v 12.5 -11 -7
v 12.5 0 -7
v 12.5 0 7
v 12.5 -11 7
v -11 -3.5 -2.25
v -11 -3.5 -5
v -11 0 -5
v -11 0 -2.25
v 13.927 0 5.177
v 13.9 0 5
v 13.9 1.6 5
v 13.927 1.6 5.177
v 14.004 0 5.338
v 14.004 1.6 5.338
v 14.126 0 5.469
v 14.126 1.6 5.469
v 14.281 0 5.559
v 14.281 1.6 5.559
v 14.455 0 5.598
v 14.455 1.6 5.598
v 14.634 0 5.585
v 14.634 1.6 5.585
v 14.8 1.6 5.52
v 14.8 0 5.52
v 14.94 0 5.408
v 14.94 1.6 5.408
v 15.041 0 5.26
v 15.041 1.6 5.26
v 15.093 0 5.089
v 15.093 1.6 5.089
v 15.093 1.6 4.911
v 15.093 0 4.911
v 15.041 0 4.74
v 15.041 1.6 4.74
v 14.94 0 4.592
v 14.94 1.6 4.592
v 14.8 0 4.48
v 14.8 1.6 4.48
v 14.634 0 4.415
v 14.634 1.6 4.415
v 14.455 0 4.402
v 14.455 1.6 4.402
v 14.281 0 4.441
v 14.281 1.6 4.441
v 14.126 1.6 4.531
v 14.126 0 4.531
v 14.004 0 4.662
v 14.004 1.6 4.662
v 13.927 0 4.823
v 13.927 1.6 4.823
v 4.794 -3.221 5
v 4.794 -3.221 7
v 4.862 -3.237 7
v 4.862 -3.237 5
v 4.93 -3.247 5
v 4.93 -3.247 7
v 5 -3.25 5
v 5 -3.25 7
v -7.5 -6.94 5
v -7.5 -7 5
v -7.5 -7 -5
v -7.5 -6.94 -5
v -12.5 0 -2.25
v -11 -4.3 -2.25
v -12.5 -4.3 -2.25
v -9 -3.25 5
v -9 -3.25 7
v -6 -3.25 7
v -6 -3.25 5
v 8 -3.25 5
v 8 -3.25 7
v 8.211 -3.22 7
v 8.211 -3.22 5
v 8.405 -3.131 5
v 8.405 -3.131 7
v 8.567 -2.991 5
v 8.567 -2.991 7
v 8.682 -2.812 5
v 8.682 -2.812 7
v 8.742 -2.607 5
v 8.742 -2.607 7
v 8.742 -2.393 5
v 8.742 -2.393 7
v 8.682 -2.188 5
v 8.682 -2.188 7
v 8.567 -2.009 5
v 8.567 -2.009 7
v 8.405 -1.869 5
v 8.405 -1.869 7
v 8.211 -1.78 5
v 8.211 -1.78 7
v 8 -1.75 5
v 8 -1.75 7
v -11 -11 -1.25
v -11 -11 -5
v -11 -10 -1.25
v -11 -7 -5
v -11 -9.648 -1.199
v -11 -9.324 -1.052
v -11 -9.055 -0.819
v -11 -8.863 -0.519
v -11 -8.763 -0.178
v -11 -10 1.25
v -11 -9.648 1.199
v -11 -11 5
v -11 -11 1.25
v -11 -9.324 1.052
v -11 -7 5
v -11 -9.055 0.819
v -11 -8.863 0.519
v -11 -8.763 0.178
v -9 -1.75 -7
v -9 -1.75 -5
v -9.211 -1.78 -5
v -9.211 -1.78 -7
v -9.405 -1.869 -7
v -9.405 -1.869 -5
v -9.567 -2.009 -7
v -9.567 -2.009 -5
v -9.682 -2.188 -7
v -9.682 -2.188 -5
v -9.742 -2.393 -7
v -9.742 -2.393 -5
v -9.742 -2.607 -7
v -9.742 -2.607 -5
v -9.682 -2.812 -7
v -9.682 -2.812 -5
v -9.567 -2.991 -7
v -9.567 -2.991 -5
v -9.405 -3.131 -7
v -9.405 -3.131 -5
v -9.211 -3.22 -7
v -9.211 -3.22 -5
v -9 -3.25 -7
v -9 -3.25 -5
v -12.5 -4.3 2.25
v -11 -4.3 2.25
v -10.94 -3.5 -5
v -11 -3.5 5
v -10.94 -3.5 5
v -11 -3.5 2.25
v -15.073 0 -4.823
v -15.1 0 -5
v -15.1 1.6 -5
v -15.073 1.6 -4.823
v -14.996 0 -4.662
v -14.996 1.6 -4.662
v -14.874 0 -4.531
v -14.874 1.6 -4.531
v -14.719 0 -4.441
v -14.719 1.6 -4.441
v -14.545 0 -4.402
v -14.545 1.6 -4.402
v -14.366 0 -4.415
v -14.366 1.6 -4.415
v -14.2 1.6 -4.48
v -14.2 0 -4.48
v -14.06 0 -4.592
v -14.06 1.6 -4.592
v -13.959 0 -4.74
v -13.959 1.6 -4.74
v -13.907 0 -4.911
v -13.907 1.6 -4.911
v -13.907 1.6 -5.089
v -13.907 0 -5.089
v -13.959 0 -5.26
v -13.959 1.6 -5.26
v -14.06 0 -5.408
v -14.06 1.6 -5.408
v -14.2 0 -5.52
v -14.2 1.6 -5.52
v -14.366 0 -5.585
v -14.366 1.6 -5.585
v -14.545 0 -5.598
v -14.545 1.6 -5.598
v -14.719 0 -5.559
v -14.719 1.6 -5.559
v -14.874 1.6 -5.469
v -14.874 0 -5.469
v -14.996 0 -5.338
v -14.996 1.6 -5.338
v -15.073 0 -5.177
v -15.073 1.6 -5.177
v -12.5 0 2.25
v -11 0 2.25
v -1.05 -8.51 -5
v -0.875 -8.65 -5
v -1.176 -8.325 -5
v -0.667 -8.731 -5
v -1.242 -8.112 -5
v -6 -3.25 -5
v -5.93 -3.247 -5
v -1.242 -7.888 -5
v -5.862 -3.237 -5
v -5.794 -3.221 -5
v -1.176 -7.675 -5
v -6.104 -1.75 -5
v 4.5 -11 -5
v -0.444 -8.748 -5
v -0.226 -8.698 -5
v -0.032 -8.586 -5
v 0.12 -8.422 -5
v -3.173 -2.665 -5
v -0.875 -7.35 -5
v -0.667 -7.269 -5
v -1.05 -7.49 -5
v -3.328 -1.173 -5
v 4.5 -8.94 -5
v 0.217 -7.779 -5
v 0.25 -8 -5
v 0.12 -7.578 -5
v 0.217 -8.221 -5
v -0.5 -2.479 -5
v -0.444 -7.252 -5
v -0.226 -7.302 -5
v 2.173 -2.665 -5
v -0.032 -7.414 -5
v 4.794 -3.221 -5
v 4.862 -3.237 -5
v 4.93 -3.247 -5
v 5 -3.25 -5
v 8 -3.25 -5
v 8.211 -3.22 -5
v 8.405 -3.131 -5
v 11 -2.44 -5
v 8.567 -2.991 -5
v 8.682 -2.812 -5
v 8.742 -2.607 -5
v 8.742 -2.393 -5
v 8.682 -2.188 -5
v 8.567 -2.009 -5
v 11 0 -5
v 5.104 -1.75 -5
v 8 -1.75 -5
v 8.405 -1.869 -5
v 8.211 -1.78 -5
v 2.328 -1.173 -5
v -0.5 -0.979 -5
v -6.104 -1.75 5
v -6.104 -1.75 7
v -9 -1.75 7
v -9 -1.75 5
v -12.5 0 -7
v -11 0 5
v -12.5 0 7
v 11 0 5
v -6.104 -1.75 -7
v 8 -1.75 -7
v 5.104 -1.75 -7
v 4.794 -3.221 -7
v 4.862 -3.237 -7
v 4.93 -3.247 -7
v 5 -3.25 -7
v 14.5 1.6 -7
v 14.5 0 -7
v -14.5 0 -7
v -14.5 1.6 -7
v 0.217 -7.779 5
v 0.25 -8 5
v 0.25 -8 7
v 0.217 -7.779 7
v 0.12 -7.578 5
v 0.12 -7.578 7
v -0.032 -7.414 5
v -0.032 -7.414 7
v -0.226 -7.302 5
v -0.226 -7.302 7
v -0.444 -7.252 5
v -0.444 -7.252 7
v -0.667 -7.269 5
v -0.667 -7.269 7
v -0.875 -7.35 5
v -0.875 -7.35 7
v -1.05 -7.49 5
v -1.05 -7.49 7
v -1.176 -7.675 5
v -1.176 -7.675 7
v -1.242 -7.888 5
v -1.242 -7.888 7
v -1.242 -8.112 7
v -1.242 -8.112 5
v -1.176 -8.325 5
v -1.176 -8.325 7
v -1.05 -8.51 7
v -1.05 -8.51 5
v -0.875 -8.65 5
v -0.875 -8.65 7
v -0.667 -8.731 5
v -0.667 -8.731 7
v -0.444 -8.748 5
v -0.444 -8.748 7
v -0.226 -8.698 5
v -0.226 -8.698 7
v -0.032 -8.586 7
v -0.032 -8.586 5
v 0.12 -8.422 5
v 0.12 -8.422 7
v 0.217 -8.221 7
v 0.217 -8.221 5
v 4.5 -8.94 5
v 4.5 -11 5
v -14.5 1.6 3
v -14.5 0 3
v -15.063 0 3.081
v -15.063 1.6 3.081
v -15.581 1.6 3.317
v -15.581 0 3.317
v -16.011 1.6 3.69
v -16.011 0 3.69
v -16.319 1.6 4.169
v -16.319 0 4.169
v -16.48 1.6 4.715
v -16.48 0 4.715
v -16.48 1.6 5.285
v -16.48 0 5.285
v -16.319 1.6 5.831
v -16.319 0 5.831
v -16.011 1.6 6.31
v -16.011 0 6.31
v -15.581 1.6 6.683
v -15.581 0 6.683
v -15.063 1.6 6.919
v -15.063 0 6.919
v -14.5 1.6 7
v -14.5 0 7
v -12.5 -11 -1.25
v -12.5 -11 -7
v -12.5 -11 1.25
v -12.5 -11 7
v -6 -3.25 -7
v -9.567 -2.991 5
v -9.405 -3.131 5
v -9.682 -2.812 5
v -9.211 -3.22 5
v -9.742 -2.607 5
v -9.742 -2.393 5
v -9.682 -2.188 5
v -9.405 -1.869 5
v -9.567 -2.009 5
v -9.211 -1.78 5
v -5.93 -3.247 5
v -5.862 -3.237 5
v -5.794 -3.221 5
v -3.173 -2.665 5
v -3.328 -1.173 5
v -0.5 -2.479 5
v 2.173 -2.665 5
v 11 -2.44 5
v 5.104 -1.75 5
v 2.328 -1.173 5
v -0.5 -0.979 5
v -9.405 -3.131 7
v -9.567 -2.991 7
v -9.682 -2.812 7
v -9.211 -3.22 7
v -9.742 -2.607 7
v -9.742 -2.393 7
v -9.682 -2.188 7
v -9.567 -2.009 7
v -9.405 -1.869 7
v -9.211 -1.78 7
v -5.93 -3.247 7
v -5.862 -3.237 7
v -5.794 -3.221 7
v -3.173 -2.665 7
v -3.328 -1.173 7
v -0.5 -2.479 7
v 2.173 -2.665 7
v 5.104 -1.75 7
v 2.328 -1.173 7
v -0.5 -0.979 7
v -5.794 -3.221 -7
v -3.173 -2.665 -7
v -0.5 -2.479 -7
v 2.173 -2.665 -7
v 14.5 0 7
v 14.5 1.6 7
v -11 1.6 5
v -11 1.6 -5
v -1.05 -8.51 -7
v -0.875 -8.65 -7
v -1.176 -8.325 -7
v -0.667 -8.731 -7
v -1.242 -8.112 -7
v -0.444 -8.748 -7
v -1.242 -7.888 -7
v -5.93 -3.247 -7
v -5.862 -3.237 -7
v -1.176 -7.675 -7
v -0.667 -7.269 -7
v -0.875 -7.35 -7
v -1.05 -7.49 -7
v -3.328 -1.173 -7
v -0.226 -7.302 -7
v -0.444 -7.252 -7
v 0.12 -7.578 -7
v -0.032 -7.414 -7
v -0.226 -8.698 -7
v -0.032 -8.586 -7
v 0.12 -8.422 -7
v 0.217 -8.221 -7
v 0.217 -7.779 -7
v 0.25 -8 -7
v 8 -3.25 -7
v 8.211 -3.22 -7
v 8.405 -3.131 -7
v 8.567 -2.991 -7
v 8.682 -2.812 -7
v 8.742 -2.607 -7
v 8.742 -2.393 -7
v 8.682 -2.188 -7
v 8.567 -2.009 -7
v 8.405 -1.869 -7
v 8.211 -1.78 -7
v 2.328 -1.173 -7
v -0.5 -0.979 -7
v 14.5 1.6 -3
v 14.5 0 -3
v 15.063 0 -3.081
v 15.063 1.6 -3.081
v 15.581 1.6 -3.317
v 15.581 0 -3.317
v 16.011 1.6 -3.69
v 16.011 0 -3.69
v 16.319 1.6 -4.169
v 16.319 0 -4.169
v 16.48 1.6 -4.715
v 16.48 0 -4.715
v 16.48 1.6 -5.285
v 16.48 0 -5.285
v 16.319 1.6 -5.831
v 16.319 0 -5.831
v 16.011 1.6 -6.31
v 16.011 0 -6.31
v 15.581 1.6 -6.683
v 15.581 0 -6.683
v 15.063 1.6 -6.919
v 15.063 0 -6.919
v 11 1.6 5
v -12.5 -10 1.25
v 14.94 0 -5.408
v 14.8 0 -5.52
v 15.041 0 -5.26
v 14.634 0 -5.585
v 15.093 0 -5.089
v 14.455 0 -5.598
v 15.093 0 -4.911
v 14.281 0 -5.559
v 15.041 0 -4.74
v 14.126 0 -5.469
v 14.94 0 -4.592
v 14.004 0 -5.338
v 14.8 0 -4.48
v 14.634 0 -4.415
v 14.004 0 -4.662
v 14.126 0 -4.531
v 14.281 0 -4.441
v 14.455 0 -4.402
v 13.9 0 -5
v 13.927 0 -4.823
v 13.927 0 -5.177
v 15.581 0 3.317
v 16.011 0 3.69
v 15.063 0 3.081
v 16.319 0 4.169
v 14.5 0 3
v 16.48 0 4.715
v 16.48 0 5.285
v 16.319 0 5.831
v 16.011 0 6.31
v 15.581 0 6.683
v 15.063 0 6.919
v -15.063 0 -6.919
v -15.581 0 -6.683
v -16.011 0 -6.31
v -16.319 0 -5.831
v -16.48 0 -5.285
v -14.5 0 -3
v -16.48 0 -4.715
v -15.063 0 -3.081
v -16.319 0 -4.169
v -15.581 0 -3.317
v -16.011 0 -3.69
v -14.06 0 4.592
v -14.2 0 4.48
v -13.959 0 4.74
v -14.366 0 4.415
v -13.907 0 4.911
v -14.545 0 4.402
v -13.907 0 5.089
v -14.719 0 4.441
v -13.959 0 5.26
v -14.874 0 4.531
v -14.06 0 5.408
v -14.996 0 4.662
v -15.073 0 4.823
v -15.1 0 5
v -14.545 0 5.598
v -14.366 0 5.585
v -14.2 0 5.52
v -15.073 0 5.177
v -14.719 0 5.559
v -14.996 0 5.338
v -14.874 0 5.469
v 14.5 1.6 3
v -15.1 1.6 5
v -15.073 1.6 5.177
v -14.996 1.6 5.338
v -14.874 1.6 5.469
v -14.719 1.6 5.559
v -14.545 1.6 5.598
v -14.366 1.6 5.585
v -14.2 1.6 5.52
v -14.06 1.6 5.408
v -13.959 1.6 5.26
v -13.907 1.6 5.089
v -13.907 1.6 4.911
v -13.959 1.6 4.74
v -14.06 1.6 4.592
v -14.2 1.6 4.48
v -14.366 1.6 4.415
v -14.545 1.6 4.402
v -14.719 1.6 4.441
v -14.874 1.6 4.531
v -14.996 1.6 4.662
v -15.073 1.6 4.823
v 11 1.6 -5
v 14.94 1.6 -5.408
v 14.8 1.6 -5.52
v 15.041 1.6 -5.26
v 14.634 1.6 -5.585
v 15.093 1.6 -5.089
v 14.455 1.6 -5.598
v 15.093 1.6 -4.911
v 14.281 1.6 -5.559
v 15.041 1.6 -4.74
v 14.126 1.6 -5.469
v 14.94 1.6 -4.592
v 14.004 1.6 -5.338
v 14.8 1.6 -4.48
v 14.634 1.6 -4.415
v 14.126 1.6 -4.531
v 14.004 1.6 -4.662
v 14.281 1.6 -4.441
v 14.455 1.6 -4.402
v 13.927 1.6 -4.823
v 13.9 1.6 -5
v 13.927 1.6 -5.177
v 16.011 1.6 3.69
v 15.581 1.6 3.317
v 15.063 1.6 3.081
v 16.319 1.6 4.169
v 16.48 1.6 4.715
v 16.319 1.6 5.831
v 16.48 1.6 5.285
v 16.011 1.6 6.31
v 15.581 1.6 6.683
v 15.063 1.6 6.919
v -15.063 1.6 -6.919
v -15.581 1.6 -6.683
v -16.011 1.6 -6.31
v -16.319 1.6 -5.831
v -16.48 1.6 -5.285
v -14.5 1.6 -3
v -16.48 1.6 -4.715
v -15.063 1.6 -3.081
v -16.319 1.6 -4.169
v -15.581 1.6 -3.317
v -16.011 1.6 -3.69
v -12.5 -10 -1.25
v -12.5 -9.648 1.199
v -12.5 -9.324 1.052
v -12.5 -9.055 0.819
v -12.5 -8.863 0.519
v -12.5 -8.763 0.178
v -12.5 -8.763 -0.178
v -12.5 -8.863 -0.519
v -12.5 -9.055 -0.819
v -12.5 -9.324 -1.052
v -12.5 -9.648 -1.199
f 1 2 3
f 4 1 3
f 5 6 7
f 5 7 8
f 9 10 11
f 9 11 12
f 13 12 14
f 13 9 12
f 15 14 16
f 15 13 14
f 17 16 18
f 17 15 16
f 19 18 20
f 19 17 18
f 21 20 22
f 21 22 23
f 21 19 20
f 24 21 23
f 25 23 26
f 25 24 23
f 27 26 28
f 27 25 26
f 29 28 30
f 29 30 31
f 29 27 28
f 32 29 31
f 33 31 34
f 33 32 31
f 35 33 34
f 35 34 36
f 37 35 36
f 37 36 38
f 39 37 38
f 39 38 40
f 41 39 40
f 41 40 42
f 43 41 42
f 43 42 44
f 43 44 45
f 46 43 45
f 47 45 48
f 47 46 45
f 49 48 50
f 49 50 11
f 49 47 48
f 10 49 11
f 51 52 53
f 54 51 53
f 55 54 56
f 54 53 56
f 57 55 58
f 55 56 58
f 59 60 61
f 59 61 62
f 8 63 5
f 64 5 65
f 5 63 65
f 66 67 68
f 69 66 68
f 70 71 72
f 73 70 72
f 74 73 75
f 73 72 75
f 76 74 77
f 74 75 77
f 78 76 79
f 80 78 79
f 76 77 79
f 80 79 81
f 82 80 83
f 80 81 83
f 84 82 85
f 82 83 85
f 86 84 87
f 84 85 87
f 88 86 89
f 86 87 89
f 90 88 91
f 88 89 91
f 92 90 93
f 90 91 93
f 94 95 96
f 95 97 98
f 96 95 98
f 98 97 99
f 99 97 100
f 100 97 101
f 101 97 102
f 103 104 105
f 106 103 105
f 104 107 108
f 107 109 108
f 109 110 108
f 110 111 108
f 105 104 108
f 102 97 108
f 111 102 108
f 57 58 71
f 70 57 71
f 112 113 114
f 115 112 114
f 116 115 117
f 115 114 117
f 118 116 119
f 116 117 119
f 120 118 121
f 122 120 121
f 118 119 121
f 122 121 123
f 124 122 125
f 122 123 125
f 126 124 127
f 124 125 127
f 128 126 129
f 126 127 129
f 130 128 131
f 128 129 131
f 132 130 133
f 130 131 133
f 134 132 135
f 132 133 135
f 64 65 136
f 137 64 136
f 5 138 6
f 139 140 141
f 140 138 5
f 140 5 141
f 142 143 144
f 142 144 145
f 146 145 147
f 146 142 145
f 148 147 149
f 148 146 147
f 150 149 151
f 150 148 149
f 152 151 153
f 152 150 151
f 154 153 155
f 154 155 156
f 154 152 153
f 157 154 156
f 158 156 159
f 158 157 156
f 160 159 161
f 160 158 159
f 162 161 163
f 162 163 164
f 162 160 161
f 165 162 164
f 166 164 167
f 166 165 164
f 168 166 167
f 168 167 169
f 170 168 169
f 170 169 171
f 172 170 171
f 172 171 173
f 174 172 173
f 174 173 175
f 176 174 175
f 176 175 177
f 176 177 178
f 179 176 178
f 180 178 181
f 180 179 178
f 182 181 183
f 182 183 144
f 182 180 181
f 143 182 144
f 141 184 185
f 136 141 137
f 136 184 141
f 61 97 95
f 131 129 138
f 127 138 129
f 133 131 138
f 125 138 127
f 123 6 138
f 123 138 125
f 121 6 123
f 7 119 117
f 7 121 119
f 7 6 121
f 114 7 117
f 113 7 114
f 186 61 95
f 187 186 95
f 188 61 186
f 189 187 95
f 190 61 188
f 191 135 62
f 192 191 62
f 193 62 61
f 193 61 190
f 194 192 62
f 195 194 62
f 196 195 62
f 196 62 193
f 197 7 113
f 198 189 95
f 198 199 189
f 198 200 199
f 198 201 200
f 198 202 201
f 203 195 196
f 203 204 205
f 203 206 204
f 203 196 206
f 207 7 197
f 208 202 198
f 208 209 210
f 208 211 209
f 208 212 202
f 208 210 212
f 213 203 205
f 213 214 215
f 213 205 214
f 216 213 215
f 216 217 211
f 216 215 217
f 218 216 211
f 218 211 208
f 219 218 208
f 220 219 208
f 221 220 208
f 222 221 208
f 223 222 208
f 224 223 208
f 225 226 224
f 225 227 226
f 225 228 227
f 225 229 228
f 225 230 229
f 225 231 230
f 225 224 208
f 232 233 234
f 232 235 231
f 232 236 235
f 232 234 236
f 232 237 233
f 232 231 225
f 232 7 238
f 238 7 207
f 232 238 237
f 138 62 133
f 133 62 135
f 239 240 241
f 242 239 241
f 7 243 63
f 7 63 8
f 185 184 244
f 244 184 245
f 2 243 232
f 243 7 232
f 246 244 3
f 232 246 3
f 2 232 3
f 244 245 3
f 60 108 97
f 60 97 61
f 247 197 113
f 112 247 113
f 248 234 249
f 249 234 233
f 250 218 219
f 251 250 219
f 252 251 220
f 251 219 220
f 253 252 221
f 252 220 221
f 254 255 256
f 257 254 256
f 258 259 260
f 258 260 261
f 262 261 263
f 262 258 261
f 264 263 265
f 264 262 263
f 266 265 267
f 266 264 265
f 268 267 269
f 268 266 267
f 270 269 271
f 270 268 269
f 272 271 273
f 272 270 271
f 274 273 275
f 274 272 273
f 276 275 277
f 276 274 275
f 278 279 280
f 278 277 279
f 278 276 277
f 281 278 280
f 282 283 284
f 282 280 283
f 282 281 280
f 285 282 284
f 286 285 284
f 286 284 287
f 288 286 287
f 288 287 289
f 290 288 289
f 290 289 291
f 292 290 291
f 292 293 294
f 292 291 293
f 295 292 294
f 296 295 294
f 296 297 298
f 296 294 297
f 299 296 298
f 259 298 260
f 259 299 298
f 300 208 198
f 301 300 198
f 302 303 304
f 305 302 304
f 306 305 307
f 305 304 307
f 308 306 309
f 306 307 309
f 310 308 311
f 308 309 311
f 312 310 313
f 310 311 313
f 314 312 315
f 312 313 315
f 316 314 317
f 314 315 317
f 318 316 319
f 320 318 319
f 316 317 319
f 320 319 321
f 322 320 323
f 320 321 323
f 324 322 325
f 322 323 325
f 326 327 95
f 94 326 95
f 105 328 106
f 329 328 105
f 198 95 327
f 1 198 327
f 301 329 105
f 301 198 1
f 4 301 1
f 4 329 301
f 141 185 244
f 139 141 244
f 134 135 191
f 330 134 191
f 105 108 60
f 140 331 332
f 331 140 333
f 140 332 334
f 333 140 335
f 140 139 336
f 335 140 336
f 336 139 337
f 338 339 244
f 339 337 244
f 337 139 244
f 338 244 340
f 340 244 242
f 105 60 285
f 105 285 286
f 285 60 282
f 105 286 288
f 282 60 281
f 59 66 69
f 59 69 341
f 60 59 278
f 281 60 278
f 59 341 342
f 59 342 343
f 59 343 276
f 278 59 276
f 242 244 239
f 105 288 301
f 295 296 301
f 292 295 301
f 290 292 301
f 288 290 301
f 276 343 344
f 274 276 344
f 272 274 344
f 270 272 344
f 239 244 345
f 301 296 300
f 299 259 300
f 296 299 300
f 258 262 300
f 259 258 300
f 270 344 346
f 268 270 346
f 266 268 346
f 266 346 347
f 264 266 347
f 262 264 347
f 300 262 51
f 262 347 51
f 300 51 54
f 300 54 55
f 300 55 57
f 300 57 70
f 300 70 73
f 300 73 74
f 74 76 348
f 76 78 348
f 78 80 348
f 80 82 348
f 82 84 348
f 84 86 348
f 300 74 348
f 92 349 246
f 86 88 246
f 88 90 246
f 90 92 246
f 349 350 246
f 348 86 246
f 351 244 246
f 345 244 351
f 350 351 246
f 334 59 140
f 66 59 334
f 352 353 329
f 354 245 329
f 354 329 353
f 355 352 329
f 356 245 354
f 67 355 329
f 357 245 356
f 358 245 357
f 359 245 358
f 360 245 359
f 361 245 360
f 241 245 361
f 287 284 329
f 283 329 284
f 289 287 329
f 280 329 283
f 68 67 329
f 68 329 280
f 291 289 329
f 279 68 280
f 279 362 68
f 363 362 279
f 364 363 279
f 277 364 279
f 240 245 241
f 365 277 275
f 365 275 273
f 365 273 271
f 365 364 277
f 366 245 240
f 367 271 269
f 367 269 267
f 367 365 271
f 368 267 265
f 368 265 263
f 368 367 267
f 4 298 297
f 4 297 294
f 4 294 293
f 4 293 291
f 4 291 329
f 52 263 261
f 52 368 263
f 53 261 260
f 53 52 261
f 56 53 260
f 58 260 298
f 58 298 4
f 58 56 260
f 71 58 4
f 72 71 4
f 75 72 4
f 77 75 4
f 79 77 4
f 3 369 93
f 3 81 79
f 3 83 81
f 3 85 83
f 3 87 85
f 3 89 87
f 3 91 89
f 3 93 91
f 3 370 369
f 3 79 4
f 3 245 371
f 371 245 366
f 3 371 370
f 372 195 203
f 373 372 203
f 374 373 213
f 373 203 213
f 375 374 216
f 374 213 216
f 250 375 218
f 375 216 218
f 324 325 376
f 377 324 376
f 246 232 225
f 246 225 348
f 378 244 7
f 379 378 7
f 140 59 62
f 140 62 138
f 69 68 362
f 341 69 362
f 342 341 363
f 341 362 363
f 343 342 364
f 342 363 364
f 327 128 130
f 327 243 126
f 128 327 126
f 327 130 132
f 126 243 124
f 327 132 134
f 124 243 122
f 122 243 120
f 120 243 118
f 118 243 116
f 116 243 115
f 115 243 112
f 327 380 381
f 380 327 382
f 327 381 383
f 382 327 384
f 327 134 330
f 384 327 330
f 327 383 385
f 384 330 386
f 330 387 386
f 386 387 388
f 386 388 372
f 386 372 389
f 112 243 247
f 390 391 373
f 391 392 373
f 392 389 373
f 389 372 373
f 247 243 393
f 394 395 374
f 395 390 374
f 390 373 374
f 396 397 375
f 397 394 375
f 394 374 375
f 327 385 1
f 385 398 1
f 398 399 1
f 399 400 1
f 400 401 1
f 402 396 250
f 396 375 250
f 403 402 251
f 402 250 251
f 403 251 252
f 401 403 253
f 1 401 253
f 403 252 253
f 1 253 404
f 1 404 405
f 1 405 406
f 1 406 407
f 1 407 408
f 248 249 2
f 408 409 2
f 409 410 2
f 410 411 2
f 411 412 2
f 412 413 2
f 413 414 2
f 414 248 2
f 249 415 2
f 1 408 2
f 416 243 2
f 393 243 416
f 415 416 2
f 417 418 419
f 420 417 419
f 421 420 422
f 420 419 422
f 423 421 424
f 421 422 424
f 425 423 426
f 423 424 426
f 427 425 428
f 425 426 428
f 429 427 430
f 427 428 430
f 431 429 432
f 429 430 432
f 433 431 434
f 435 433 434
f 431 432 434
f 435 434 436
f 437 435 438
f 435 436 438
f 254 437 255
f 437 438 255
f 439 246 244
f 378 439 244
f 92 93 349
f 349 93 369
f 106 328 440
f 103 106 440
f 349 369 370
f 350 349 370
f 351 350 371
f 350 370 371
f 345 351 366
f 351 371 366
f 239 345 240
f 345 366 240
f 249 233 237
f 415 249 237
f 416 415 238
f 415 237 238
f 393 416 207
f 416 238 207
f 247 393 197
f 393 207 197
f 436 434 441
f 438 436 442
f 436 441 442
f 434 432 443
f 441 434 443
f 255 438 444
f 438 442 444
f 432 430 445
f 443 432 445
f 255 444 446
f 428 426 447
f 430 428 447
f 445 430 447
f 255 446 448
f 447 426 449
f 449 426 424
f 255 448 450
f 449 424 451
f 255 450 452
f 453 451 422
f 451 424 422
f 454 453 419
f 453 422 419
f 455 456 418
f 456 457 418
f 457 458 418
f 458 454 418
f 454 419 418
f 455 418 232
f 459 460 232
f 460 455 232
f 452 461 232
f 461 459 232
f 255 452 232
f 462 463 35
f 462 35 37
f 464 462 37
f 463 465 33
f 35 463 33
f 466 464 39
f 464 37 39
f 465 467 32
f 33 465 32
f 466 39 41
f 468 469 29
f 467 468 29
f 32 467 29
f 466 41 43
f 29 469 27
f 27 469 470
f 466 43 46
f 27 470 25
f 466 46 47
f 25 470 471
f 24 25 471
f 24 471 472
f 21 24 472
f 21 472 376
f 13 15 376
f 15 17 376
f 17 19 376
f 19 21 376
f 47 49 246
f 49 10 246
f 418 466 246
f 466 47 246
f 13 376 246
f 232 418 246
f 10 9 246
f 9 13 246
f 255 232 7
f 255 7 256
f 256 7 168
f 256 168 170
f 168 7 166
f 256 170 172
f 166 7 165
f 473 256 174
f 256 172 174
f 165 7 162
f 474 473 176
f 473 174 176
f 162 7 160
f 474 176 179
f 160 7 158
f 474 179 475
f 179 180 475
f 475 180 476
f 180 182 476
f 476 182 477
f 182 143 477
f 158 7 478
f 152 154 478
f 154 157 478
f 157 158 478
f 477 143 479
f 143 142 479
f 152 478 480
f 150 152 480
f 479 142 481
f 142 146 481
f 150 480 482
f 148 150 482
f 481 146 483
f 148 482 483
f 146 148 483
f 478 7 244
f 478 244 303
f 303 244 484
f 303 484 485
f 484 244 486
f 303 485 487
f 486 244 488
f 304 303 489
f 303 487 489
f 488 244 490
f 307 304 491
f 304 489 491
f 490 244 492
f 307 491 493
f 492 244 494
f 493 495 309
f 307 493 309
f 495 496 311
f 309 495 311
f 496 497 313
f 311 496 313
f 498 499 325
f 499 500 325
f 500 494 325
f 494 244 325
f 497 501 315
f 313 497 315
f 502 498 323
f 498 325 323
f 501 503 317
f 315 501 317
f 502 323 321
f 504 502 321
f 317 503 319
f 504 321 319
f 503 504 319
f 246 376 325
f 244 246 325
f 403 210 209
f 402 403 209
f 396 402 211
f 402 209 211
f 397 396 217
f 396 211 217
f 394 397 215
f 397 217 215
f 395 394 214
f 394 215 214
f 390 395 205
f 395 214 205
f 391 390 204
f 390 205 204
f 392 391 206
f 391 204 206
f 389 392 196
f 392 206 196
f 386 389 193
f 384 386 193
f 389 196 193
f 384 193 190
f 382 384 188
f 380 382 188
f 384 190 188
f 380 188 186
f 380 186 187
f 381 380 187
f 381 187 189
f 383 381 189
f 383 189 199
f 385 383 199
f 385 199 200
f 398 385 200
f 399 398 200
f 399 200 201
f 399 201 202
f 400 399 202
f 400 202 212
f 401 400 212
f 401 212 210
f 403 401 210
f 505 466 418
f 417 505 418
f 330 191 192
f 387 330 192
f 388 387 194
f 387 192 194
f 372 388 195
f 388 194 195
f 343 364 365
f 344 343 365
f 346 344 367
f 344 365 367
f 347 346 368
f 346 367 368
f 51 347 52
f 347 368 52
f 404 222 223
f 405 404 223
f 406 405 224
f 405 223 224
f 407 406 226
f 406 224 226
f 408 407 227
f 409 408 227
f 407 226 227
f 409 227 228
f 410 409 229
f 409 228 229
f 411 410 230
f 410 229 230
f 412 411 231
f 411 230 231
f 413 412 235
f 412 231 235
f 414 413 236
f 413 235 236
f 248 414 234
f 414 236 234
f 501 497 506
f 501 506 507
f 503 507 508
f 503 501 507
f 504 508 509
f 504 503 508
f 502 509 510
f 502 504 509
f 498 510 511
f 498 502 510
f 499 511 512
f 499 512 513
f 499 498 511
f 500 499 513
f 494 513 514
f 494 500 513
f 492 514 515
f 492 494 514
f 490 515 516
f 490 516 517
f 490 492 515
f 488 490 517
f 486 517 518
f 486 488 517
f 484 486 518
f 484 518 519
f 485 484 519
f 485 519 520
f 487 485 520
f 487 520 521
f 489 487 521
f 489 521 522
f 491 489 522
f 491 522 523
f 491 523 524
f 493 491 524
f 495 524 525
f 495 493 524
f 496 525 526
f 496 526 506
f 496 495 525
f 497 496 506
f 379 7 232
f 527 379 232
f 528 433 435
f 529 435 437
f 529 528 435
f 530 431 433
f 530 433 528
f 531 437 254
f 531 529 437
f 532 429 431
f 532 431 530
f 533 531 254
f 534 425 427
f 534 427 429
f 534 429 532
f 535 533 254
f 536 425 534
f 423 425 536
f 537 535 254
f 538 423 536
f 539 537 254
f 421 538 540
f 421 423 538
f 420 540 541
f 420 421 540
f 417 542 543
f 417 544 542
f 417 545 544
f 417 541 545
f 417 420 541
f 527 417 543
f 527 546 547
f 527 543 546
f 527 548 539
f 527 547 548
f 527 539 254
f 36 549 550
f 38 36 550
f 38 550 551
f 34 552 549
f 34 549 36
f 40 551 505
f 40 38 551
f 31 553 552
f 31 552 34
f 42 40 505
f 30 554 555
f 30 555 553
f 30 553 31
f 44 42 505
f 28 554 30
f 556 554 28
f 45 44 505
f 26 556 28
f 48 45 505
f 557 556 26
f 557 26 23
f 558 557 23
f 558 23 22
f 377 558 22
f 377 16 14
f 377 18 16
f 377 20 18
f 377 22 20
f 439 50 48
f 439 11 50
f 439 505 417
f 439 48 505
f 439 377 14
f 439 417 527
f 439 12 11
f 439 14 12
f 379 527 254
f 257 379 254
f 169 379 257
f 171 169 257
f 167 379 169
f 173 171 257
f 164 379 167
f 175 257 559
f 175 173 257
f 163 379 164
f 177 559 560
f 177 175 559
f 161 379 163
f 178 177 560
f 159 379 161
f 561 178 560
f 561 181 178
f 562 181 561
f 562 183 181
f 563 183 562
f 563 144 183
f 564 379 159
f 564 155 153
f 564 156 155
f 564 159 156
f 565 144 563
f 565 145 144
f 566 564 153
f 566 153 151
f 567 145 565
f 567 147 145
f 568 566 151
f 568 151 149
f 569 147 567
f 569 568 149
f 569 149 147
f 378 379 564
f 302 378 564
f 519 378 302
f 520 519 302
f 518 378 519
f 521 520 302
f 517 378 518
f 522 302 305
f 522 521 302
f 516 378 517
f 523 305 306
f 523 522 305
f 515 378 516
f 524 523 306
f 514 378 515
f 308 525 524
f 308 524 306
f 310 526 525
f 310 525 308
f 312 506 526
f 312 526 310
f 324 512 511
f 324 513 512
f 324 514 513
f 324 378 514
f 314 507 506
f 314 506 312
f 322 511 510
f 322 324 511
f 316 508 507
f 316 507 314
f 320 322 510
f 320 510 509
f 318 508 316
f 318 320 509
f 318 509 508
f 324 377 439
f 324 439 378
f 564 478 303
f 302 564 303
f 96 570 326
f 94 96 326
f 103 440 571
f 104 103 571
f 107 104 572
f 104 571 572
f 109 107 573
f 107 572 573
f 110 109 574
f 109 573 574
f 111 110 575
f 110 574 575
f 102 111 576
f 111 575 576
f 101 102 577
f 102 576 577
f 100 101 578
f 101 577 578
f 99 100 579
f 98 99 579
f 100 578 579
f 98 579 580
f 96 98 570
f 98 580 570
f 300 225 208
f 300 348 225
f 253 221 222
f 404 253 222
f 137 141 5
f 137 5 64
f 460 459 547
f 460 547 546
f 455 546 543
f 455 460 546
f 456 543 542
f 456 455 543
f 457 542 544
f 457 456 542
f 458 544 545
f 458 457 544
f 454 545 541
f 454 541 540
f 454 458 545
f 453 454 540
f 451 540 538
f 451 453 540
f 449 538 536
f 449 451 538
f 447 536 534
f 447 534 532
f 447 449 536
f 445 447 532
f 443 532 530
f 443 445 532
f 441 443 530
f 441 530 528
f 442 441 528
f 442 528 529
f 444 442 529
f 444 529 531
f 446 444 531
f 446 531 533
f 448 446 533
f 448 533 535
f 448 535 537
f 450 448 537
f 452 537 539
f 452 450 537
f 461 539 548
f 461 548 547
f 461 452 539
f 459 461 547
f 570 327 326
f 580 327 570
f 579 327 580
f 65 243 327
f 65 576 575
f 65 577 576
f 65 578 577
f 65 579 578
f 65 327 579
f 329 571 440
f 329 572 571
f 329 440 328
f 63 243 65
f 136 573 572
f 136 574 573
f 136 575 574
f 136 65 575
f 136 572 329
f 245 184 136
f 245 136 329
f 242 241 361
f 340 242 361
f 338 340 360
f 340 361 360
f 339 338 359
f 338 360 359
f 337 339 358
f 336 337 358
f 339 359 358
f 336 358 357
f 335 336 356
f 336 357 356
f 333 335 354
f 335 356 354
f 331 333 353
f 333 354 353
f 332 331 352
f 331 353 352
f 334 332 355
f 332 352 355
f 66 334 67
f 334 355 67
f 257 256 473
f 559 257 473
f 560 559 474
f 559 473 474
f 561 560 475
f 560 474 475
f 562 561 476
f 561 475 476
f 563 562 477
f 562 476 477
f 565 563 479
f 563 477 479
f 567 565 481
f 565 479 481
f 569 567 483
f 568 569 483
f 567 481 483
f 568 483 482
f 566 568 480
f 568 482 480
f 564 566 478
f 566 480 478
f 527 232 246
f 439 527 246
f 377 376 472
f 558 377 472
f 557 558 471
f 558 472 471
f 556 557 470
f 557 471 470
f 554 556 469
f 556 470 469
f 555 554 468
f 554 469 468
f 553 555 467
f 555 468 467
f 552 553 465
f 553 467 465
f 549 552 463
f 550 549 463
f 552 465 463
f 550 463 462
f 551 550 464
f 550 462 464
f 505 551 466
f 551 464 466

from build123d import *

# Parameters (mm, degrees)
F0_W          = 25
F0_H          = 14
F0_W_2        = 22
F0_H_2        = 10
F1_DEPTH      = 11
F2_R          = 0.75
F3_DEPTH      = 12.5
F4_W          = 4.3
F4_H          = 4.5
F5_DEPTH      = 1.5
F7_DEPTH      = 5
F7_DEPTH_BACK = 5
F8_R          = 0.6
F9_DEPTH      = 1.6


with BuildPart() as f1:
    # F0 (on Front) → F1 (new body)
    with BuildSketch(Plane.XZ):
        Rectangle(F0_W, F0_H)
        Rectangle(F0_W_2, F0_H_2, mode=Mode.SUBTRACT)
    extrude(amount=F1_DEPTH)

    # F2 (on Top) → F3 (cut, symmetric)
    with BuildSketch(Plane.XY):
        with Locations((-0.5, -8)):
            Circle(F2_R)
        with BuildLine():
            Line((-6.75, -2.5), (-6, -2.5))
            ThreePointArc((-6, -2.5), (-5.6384915333, -2.4002553745), (-5.2751764069, -2.3073065675))
            ThreePointArc((-5.2751764069, -2.3073065675), (-5.5428457997, -1.9054328993), (-6, -1.75))
            Line((-6, -1.75), (-6.104165702, -1.75))
            ThreePointArc((-6.104165702, -1.75), (-6.1552263336, -1.7643931667), (-6.20625, -1.7789168304))
            ThreePointArc((-6.20625, -1.7789168304), (-6.5988269784, -2.0484402033), (-6.75, -2.5))
        make_face()
        with BuildLine():
            ThreePointArc((-5.2751764069, -2.3073065675), (-5.6384915333, -2.4002553745), (-6, -2.5))
            Line((-6, -2.5), (-6.75, -2.5))
            ThreePointArc((-6.75, -2.5), (-6.5303300859, -3.0303300859), (-6, -3.25))
            ThreePointArc((-6, -3.25), (-5.8958663772, -3.2427356115), (-5.79375, -3.2210831696))
            ThreePointArc((-5.79375, -3.2210831696), (-5.3477182905, -2.8701737044), (-5.2751764069, -2.3073065675))
        make_face()
        with BuildLine():
            ThreePointArc((-6, -1.75), (-5.5428457997, -1.9054328993), (-5.2751764069, -2.3073065675))
            ThreePointArc((-5.2751764069, -2.3073065675), (-3.2768966077, -1.9226015494), (-1.2498681525, -1.742947023))
            ThreePointArc((-1.2498681525, -1.742947023), (-1.0352788409, -1.2035498083), (-0.5, -0.978884523))
            ThreePointArc((-0.5, -0.978884523), (-3.328484236, -1.1725673206), (-6.104165702, -1.75))
            Line((-6.104165702, -1.75), (-6, -1.75))
        make_face()
        with BuildLine():
            ThreePointArc((-1.2498681525, -1.742947023), (-3.2768966077, -1.9226015494), (-5.2751764069, -2.3073065675))
            ThreePointArc((-5.2751764069, -2.3073065675), (-5.3477182905, -2.8701737044), (-5.79375, -3.2210831696))
            ThreePointArc((-5.79375, -3.2210831696), (-3.1727629849, -2.6653371609), (-0.5, -2.478884523))
            ThreePointArc((-0.5, -2.478884523), (-1.0253347147, -2.2641633639), (-1.2498681525, -1.742947023))
        make_face()
        with BuildLine():
            ThreePointArc((-6, -3.25), (-6.5303300859, -3.0303300859), (-6.75, -2.5))
            ThreePointArc((-6.75, -2.5), (-6.5988269784, -2.0484402033), (-6.20625, -1.7789168304))
            ThreePointArc((-6.20625, -1.7789168304), (-6.1552263336, -1.7643931667), (-6.104165702, -1.75))
            Line((-6.104165702, -1.75), (-9, -1.75))
            ThreePointArc((-9, -1.75), (-9.75, -2.5), (-9, -3.25))
            Line((-9, -3.25), (-6, -3.25))
        make_face()
        with BuildLine():
            ThreePointArc((-0.5, -0.978884523), (-1.0352788409, -1.2035498083), (-1.2498681525, -1.742947023))
            ThreePointArc((-1.2498681525, -1.742947023), (-0.875, -1.7324004571), (-0.5, -1.728884523))
            ThreePointArc((-0.5, -1.728884523), (-0.125, -1.7324004571), (0.2498681525, -1.742947023))
            ThreePointArc((0.2498681525, -1.742947023), (0.0352788409, -1.2035498083), (-0.5, -0.978884523))
        make_face()
        with BuildLine():
            ThreePointArc((-0.5, -1.728884523), (-0.875, -1.7324004571), (-1.2498681525, -1.742947023))
            ThreePointArc((-1.2498681525, -1.742947023), (-1.0253347147, -2.2641633639), (-0.5, -2.478884523))
            ThreePointArc((-0.5, -2.478884523), (0.0253347147, -2.2641633639), (0.2498681525, -1.742947023))
            ThreePointArc((0.2498681525, -1.742947023), (-0.125, -1.7324004571), (-0.5, -1.728884523))
        make_face()
        with BuildLine():
            ThreePointArc((0.2498681525, -1.742947023), (0.0253347147, -2.2641633639), (-0.5, -2.478884523))
            ThreePointArc((-0.5, -2.478884523), (2.1727629849, -2.6653371609), (4.79375, -3.2210831696))
            ThreePointArc((4.79375, -3.2210831696), (4.3477182905, -2.8701737044), (4.2751764069, -2.3073065675))
            ThreePointArc((4.2751764069, -2.3073065675), (2.2768966077, -1.9226015494), (0.2498681525, -1.742947023))
        make_face()
        with BuildLine():
            ThreePointArc((5.104165702, -1.75), (2.328484236, -1.1725673206), (-0.5, -0.978884523))
            ThreePointArc((-0.5, -0.978884523), (0.0352788409, -1.2035498083), (0.2498681525, -1.742947023))
            ThreePointArc((0.2498681525, -1.742947023), (2.2768966077, -1.9226015494), (4.2751764069, -2.3073065675))
            ThreePointArc((4.2751764069, -2.3073065675), (4.5428457997, -1.9054328993), (5, -1.75))
            Line((5, -1.75), (5.104165702, -1.75))
        make_face()
        with BuildLine():
            ThreePointArc((4.2751764069, -2.3073065675), (4.3477182905, -2.8701737044), (4.79375, -3.2210831696))
            ThreePointArc((4.79375, -3.2210831696), (4.8958663772, -3.2427356115), (5, -3.25))
            ThreePointArc((5, -3.25), (5.5303300859, -3.0303300859), (5.75, -2.5))
            Line((5.75, -2.5), (5, -2.5))
            ThreePointArc((5, -2.5), (4.6384915333, -2.4002553745), (4.2751764069, -2.3073065675))
        make_face()
        with BuildLine():
            Line((8, -1.75), (5.104165702, -1.75))
            ThreePointArc((5.104165702, -1.75), (5.1552263336, -1.7643931667), (5.20625, -1.7789168304))
            ThreePointArc((5.20625, -1.7789168304), (5.5988269784, -2.0484402033), (5.75, -2.5))
            ThreePointArc((5.75, -2.5), (5.5303300859, -3.0303300859), (5, -3.25))
            Line((5, -3.25), (8, -3.25))
            ThreePointArc((8, -3.25), (8.75, -2.5), (8, -1.75))
        make_face()
        with BuildLine():
            ThreePointArc((5.20625, -1.7789168304), (5.1552263336, -1.7643931667), (5.104165702, -1.75))
            Line((5.104165702, -1.75), (5, -1.75))
            ThreePointArc((5, -1.75), (4.5428457997, -1.9054328993), (4.2751764069, -2.3073065675))
            ThreePointArc((4.2751764069, -2.3073065675), (4.6384915333, -2.4002553745), (5, -2.5))
            Line((5, -2.5), (5.75, -2.5))
            ThreePointArc((5.75, -2.5), (5.5988269784, -2.0484402033), (5.20625, -1.7789168304))
        make_face()
    extrude(amount=F3_DEPTH, both=True, mode=Mode.SUBTRACT)

    # F4 (on face) → F5 (cut, through all)
    with BuildSketch(Plane(origin=(-12.5, 0, 0), x_dir=(0, -1, 0), z_dir=(-1, 0, 0))):
        with Locations((2.15, 0)):
            Rectangle(F4_W, F4_H)
        with BuildLine():
            Line((11, 1.25), (10, 1.25))
            ThreePointArc((10, 1.25), (8.75, 0), (10, -1.25))
            Line((10, -1.25), (11, -1.25))
            Line((11, -1.25), (11, 1.25))
        make_face()
    extrude(amount=-F5_DEPTH, mode=Mode.SUBTRACT)

    # F6 (on Top) → F7 (join, two sides)
    with BuildSketch(Plane.XY) as f7_sk:
        Polygon((11, -2.439696962), (4.5, -8.939696962), (4.5, -11), (11, -11), align=None)
        Polygon((-7.5, -7), (-7.5, -6.939696962), (-10.939696962, -3.5), (-11, -3.5), (-11, -7), align=None)
    extrude(amount=F7_DEPTH)
    extrude(f7_sk.sketch, amount=-F7_DEPTH_BACK)


with BuildPart() as f9:
    # F8 (on face) → F9 (new body)
    with BuildSketch(Plane(origin=(0, 0, 0), x_dir=(-1, 0, 0), z_dir=(0, 1, 0))):
        with BuildLine():
            Line((11, 2.25), (11, -2.25))
            Line((11, -2.25), (12.5, -2.25))
            Line((12.5, -2.25), (12.5, -7))
            Line((12.5, -7), (14.5, -7))
            ThreePointArc((14.5, -7), (16.5, -5), (14.5, -3))
            Line((14.5, -3), (14.5, 0))
            Line((14.5, 0), (14.5, 3))
            ThreePointArc((14.5, 3), (16.5, 5), (14.5, 7))
            Line((14.5, 7), (12.5, 7))
            Line((12.5, 7), (12.5, 2.25))
            Line((12.5, 2.25), (11, 2.25))
        make_face()
        with Locations((14.5, -5)):
            Circle(F8_R, mode=Mode.SUBTRACT)
        with Locations((14.5, 5)):
            Circle(F8_R, mode=Mode.SUBTRACT)
        Polygon((11, -5), (-11, -5), (-11, 5), (11, 5), (11, 2.25), (12.5, 2.25), (12.5, 7), (-12.5, 7), (-12.5, -7), (12.5, -7), (12.5, -2.25), (11, -2.25), align=None)
        with BuildLine():
            Line((-14.5, -7), (-12.5, -7))
            Line((-12.5, -7), (-12.5, 7))
            Line((-12.5, 7), (-14.5, 7))
            ThreePointArc((-14.5, 7), (-16.5, 5), (-14.5, 3))
            Line((-14.5, 3), (-14.5, 0))
            Line((-14.5, 0), (-14.5, -3))
            ThreePointArc((-14.5, -3), (-16.5, -5), (-14.5, -7))
        make_face()
        with Locations((-14.5, -5)):
            Circle(F8_R, mode=Mode.SUBTRACT)
        with Locations((-14.5, 5)):
            Circle(F8_R, mode=Mode.SUBTRACT)
    extrude(amount=F9_DEPTH)


solid = Compound([f1.part, f9.part])
